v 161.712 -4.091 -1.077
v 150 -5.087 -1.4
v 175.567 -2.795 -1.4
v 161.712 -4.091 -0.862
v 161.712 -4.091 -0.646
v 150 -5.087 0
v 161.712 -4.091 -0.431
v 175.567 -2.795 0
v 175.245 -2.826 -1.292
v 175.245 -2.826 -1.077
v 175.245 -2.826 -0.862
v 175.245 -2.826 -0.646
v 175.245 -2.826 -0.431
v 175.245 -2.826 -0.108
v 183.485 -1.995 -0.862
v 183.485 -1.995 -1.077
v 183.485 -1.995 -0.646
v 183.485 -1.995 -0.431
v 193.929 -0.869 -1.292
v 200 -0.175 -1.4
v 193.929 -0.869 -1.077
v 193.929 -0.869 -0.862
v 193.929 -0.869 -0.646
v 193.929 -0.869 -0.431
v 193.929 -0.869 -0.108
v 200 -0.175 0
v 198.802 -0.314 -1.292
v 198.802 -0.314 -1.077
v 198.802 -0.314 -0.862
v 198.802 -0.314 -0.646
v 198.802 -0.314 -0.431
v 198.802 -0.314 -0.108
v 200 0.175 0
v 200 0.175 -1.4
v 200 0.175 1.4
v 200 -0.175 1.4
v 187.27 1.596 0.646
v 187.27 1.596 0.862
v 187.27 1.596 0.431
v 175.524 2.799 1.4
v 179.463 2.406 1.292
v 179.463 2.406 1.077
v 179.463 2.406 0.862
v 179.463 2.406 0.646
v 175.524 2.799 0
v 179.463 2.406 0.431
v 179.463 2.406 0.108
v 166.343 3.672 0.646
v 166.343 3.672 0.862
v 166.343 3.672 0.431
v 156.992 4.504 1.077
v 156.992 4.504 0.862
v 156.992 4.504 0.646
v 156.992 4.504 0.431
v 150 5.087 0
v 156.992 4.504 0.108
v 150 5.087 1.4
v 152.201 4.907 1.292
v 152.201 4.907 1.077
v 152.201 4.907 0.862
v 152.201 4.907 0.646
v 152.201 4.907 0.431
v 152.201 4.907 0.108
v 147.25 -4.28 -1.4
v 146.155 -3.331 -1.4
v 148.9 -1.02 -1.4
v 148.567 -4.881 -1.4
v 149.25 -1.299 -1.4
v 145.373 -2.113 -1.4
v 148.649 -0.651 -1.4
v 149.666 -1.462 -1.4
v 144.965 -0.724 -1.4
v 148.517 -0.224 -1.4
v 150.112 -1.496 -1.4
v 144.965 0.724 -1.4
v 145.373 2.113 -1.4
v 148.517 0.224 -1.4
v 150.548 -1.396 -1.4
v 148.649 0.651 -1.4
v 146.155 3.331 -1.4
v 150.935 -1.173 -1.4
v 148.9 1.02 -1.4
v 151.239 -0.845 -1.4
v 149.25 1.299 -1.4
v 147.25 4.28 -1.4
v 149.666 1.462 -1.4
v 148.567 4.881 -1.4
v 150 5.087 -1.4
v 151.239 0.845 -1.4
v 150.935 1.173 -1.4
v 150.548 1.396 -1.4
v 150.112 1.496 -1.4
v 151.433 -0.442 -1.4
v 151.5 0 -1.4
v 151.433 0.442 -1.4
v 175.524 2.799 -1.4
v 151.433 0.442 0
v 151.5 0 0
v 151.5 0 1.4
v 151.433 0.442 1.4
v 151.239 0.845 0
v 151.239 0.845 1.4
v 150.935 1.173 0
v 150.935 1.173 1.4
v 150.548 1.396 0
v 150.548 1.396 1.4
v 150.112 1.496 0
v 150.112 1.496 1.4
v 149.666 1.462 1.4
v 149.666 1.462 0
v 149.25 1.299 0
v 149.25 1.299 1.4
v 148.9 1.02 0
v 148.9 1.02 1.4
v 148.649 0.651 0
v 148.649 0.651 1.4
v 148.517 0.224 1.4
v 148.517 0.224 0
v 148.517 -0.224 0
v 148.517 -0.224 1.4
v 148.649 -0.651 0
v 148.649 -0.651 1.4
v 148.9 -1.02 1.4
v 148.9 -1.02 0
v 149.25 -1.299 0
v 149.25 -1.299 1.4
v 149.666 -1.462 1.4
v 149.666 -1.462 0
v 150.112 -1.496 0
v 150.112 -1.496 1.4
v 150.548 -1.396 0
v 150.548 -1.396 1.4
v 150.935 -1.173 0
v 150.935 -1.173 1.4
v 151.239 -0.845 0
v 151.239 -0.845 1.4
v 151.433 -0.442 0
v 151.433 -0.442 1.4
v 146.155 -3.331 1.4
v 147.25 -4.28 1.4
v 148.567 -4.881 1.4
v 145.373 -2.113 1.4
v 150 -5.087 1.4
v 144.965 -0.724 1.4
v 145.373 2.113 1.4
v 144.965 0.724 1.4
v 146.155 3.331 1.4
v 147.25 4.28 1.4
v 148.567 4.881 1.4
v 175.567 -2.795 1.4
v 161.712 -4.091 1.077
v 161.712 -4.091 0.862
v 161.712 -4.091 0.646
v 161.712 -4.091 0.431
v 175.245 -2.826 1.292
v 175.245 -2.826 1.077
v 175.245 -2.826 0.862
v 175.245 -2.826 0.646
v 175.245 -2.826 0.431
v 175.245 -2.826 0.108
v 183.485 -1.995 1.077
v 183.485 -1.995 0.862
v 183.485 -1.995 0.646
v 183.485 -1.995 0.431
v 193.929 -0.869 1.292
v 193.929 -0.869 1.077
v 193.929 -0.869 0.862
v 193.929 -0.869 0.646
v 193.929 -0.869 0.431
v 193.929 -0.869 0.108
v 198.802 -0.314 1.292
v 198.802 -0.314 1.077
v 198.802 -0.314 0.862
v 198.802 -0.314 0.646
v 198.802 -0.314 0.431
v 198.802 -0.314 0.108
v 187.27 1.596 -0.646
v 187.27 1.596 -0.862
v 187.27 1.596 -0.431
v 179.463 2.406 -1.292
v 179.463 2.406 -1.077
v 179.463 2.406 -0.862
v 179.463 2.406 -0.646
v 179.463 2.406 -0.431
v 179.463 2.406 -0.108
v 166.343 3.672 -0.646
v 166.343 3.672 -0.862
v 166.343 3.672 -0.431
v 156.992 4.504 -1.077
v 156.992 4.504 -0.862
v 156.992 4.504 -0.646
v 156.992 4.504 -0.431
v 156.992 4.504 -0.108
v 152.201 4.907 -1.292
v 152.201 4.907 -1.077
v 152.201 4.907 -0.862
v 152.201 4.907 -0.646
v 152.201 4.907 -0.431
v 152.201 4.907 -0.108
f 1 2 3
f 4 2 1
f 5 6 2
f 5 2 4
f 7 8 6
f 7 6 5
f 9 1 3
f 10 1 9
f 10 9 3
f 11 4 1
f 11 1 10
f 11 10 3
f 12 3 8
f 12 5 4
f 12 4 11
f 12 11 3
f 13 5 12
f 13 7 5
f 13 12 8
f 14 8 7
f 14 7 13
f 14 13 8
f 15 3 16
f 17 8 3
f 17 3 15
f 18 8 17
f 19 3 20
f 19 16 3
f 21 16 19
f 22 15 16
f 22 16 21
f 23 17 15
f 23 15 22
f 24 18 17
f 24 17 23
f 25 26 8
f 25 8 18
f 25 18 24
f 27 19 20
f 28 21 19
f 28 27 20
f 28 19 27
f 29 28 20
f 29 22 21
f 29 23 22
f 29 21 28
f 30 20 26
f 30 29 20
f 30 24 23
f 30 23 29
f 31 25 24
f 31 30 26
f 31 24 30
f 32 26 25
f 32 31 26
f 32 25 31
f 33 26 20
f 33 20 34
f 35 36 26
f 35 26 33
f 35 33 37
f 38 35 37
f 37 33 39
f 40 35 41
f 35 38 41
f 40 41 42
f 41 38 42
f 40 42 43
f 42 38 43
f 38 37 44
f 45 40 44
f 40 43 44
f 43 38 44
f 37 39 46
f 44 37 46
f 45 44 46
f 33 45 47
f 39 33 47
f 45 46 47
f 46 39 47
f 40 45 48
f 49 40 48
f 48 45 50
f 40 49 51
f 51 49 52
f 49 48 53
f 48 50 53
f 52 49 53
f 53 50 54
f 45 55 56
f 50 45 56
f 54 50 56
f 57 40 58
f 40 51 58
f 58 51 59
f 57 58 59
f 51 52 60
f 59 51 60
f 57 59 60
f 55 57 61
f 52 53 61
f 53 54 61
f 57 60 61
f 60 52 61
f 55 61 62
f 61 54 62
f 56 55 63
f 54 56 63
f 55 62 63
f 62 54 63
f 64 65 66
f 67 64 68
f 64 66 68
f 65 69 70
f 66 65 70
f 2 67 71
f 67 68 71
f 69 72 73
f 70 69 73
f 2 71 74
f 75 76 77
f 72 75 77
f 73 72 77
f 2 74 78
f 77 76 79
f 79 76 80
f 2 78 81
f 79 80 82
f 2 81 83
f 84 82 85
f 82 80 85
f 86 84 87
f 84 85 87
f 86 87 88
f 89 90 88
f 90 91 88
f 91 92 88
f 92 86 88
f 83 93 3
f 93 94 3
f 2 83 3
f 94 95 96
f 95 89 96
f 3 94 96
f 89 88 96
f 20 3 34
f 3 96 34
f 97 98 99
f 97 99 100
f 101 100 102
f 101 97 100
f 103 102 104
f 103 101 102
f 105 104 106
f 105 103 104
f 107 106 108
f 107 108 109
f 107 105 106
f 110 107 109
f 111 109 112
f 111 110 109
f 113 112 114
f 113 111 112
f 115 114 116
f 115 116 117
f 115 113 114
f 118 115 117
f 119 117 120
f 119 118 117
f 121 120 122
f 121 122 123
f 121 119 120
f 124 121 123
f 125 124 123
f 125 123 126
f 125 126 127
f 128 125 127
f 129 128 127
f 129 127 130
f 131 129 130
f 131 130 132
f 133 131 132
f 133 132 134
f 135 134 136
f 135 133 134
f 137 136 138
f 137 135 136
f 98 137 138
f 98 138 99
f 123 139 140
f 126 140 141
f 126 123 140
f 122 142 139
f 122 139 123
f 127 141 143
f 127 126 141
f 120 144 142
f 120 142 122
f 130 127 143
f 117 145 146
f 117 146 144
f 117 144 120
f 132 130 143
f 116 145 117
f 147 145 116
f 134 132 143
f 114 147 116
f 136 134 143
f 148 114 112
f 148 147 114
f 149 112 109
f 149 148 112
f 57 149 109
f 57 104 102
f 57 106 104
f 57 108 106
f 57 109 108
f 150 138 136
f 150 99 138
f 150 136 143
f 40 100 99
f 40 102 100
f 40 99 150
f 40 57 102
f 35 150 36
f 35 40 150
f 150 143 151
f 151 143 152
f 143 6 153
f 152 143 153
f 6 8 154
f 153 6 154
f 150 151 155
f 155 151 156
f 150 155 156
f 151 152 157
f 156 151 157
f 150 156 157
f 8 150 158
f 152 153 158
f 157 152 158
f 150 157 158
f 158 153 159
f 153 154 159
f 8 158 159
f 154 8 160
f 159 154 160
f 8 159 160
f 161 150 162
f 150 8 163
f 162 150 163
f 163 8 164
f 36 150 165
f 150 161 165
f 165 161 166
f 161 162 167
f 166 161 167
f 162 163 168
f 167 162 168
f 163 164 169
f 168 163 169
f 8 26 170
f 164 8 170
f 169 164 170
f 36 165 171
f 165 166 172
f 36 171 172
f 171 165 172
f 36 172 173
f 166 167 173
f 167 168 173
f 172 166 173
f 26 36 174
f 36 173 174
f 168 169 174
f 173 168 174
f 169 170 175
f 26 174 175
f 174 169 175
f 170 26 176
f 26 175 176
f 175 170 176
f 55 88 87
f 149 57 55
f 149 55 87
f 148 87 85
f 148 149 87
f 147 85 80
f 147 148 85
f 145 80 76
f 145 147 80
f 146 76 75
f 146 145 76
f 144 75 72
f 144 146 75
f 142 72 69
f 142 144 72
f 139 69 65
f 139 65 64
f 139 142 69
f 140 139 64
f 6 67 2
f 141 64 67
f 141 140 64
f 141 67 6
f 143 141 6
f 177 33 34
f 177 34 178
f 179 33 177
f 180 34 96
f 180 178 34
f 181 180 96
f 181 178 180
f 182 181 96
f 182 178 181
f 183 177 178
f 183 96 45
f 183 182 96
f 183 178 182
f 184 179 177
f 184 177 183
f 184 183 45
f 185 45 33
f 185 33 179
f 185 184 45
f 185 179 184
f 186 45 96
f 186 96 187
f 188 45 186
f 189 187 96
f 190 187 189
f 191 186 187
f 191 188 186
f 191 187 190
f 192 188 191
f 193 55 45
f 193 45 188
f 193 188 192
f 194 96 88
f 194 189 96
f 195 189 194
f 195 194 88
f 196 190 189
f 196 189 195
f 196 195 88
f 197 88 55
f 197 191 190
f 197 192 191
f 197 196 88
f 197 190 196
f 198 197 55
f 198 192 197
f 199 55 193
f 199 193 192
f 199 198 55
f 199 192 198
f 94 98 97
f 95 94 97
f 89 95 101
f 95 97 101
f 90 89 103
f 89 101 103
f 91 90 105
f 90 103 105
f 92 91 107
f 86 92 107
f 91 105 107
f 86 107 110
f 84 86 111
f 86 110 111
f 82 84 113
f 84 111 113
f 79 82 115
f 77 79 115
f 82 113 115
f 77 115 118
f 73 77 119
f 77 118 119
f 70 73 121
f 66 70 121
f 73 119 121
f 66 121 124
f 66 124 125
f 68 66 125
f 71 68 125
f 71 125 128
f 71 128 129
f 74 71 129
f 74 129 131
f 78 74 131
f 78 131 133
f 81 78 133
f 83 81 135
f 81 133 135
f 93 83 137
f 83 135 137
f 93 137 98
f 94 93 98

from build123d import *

# Parameters (mm, degrees)
SKETCH_1_R      = 1.5
EXTRUDE_1_DEPTH = 1.4


with BuildPart() as part:
    # Эскиз1 → Бобышка-Вытянуть1 (new, symmetric)
    with BuildSketch(Plane.XY):
        with BuildLine():
            Line((200, -0.17472), (200, 0.17472))
            add(Edge.make_bspline(
                [(200, 0.17472), (199.600682765, 0.221288408), (198.485364747, 0.351356884), (196.461970705, 0.583806064), (193.785612886, 0.886133118), (190.657944971, 1.231938396), (187.176422045, 1.607822673), (183.406732336, 2.004490231), (179.398353357, 2.414941802), (173.685417785, 2.983325928), (167.76840734, 3.545499789), (161.683149627, 4.096290968), (156.969182151, 4.508276909), (153.064759225, 4.837015276), (150.733840137, 5.027649351), (150, 5.087100899)],
                knots=[0, 0, 0, 0, 0.007144724, 0.019955661, 0.036196061, 0.055011184, 0.075878938, 0.098428866, 0.122375554, 0.147487886, 0.200459747, 0.22800517, 0.256076454, 0.284555151, 0.297639613, 0.297639613, 0.297639613, 0.297639613], degree=3))
            ThreePointArc((150, 5.087100899), (144.91290042, 0), (150, -5.087100899))
            add(Edge.make_bspline(
                [(150, -5.087100899), (150.733840137, -5.027649351), (153.064759225, -4.837015276), (156.969182151, -4.508276909), (161.683149627, -4.096290968), (167.76840734, -3.545499789), (173.685417785, -2.983325928), (179.398353357, -2.414941802), (183.406732336, -2.004490231), (187.176422045, -1.607822673), (190.657944971, -1.231938396), (193.785612886, -0.886133118), (196.461970705, -0.583806064), (198.485364747, -0.351356884), (199.600682765, -0.221288408), (200, -0.17472)],
                knots=[0.702360387, 0.702360387, 0.702360387, 0.702360387, 0.715444849, 0.743923546, 0.77199483, 0.799540253, 0.852512114, 0.877624446, 0.901571134, 0.924121062, 0.944988816, 0.963803939, 0.980044339, 0.992855276, 1, 1, 1, 1], degree=3))
        make_face()
        with Locations((150.000001319, 0)):
            Circle(SKETCH_1_R, mode=Mode.SUBTRACT)
    extrude(amount=EXTRUDE_1_DEPTH, both=True)


solid = part.part
